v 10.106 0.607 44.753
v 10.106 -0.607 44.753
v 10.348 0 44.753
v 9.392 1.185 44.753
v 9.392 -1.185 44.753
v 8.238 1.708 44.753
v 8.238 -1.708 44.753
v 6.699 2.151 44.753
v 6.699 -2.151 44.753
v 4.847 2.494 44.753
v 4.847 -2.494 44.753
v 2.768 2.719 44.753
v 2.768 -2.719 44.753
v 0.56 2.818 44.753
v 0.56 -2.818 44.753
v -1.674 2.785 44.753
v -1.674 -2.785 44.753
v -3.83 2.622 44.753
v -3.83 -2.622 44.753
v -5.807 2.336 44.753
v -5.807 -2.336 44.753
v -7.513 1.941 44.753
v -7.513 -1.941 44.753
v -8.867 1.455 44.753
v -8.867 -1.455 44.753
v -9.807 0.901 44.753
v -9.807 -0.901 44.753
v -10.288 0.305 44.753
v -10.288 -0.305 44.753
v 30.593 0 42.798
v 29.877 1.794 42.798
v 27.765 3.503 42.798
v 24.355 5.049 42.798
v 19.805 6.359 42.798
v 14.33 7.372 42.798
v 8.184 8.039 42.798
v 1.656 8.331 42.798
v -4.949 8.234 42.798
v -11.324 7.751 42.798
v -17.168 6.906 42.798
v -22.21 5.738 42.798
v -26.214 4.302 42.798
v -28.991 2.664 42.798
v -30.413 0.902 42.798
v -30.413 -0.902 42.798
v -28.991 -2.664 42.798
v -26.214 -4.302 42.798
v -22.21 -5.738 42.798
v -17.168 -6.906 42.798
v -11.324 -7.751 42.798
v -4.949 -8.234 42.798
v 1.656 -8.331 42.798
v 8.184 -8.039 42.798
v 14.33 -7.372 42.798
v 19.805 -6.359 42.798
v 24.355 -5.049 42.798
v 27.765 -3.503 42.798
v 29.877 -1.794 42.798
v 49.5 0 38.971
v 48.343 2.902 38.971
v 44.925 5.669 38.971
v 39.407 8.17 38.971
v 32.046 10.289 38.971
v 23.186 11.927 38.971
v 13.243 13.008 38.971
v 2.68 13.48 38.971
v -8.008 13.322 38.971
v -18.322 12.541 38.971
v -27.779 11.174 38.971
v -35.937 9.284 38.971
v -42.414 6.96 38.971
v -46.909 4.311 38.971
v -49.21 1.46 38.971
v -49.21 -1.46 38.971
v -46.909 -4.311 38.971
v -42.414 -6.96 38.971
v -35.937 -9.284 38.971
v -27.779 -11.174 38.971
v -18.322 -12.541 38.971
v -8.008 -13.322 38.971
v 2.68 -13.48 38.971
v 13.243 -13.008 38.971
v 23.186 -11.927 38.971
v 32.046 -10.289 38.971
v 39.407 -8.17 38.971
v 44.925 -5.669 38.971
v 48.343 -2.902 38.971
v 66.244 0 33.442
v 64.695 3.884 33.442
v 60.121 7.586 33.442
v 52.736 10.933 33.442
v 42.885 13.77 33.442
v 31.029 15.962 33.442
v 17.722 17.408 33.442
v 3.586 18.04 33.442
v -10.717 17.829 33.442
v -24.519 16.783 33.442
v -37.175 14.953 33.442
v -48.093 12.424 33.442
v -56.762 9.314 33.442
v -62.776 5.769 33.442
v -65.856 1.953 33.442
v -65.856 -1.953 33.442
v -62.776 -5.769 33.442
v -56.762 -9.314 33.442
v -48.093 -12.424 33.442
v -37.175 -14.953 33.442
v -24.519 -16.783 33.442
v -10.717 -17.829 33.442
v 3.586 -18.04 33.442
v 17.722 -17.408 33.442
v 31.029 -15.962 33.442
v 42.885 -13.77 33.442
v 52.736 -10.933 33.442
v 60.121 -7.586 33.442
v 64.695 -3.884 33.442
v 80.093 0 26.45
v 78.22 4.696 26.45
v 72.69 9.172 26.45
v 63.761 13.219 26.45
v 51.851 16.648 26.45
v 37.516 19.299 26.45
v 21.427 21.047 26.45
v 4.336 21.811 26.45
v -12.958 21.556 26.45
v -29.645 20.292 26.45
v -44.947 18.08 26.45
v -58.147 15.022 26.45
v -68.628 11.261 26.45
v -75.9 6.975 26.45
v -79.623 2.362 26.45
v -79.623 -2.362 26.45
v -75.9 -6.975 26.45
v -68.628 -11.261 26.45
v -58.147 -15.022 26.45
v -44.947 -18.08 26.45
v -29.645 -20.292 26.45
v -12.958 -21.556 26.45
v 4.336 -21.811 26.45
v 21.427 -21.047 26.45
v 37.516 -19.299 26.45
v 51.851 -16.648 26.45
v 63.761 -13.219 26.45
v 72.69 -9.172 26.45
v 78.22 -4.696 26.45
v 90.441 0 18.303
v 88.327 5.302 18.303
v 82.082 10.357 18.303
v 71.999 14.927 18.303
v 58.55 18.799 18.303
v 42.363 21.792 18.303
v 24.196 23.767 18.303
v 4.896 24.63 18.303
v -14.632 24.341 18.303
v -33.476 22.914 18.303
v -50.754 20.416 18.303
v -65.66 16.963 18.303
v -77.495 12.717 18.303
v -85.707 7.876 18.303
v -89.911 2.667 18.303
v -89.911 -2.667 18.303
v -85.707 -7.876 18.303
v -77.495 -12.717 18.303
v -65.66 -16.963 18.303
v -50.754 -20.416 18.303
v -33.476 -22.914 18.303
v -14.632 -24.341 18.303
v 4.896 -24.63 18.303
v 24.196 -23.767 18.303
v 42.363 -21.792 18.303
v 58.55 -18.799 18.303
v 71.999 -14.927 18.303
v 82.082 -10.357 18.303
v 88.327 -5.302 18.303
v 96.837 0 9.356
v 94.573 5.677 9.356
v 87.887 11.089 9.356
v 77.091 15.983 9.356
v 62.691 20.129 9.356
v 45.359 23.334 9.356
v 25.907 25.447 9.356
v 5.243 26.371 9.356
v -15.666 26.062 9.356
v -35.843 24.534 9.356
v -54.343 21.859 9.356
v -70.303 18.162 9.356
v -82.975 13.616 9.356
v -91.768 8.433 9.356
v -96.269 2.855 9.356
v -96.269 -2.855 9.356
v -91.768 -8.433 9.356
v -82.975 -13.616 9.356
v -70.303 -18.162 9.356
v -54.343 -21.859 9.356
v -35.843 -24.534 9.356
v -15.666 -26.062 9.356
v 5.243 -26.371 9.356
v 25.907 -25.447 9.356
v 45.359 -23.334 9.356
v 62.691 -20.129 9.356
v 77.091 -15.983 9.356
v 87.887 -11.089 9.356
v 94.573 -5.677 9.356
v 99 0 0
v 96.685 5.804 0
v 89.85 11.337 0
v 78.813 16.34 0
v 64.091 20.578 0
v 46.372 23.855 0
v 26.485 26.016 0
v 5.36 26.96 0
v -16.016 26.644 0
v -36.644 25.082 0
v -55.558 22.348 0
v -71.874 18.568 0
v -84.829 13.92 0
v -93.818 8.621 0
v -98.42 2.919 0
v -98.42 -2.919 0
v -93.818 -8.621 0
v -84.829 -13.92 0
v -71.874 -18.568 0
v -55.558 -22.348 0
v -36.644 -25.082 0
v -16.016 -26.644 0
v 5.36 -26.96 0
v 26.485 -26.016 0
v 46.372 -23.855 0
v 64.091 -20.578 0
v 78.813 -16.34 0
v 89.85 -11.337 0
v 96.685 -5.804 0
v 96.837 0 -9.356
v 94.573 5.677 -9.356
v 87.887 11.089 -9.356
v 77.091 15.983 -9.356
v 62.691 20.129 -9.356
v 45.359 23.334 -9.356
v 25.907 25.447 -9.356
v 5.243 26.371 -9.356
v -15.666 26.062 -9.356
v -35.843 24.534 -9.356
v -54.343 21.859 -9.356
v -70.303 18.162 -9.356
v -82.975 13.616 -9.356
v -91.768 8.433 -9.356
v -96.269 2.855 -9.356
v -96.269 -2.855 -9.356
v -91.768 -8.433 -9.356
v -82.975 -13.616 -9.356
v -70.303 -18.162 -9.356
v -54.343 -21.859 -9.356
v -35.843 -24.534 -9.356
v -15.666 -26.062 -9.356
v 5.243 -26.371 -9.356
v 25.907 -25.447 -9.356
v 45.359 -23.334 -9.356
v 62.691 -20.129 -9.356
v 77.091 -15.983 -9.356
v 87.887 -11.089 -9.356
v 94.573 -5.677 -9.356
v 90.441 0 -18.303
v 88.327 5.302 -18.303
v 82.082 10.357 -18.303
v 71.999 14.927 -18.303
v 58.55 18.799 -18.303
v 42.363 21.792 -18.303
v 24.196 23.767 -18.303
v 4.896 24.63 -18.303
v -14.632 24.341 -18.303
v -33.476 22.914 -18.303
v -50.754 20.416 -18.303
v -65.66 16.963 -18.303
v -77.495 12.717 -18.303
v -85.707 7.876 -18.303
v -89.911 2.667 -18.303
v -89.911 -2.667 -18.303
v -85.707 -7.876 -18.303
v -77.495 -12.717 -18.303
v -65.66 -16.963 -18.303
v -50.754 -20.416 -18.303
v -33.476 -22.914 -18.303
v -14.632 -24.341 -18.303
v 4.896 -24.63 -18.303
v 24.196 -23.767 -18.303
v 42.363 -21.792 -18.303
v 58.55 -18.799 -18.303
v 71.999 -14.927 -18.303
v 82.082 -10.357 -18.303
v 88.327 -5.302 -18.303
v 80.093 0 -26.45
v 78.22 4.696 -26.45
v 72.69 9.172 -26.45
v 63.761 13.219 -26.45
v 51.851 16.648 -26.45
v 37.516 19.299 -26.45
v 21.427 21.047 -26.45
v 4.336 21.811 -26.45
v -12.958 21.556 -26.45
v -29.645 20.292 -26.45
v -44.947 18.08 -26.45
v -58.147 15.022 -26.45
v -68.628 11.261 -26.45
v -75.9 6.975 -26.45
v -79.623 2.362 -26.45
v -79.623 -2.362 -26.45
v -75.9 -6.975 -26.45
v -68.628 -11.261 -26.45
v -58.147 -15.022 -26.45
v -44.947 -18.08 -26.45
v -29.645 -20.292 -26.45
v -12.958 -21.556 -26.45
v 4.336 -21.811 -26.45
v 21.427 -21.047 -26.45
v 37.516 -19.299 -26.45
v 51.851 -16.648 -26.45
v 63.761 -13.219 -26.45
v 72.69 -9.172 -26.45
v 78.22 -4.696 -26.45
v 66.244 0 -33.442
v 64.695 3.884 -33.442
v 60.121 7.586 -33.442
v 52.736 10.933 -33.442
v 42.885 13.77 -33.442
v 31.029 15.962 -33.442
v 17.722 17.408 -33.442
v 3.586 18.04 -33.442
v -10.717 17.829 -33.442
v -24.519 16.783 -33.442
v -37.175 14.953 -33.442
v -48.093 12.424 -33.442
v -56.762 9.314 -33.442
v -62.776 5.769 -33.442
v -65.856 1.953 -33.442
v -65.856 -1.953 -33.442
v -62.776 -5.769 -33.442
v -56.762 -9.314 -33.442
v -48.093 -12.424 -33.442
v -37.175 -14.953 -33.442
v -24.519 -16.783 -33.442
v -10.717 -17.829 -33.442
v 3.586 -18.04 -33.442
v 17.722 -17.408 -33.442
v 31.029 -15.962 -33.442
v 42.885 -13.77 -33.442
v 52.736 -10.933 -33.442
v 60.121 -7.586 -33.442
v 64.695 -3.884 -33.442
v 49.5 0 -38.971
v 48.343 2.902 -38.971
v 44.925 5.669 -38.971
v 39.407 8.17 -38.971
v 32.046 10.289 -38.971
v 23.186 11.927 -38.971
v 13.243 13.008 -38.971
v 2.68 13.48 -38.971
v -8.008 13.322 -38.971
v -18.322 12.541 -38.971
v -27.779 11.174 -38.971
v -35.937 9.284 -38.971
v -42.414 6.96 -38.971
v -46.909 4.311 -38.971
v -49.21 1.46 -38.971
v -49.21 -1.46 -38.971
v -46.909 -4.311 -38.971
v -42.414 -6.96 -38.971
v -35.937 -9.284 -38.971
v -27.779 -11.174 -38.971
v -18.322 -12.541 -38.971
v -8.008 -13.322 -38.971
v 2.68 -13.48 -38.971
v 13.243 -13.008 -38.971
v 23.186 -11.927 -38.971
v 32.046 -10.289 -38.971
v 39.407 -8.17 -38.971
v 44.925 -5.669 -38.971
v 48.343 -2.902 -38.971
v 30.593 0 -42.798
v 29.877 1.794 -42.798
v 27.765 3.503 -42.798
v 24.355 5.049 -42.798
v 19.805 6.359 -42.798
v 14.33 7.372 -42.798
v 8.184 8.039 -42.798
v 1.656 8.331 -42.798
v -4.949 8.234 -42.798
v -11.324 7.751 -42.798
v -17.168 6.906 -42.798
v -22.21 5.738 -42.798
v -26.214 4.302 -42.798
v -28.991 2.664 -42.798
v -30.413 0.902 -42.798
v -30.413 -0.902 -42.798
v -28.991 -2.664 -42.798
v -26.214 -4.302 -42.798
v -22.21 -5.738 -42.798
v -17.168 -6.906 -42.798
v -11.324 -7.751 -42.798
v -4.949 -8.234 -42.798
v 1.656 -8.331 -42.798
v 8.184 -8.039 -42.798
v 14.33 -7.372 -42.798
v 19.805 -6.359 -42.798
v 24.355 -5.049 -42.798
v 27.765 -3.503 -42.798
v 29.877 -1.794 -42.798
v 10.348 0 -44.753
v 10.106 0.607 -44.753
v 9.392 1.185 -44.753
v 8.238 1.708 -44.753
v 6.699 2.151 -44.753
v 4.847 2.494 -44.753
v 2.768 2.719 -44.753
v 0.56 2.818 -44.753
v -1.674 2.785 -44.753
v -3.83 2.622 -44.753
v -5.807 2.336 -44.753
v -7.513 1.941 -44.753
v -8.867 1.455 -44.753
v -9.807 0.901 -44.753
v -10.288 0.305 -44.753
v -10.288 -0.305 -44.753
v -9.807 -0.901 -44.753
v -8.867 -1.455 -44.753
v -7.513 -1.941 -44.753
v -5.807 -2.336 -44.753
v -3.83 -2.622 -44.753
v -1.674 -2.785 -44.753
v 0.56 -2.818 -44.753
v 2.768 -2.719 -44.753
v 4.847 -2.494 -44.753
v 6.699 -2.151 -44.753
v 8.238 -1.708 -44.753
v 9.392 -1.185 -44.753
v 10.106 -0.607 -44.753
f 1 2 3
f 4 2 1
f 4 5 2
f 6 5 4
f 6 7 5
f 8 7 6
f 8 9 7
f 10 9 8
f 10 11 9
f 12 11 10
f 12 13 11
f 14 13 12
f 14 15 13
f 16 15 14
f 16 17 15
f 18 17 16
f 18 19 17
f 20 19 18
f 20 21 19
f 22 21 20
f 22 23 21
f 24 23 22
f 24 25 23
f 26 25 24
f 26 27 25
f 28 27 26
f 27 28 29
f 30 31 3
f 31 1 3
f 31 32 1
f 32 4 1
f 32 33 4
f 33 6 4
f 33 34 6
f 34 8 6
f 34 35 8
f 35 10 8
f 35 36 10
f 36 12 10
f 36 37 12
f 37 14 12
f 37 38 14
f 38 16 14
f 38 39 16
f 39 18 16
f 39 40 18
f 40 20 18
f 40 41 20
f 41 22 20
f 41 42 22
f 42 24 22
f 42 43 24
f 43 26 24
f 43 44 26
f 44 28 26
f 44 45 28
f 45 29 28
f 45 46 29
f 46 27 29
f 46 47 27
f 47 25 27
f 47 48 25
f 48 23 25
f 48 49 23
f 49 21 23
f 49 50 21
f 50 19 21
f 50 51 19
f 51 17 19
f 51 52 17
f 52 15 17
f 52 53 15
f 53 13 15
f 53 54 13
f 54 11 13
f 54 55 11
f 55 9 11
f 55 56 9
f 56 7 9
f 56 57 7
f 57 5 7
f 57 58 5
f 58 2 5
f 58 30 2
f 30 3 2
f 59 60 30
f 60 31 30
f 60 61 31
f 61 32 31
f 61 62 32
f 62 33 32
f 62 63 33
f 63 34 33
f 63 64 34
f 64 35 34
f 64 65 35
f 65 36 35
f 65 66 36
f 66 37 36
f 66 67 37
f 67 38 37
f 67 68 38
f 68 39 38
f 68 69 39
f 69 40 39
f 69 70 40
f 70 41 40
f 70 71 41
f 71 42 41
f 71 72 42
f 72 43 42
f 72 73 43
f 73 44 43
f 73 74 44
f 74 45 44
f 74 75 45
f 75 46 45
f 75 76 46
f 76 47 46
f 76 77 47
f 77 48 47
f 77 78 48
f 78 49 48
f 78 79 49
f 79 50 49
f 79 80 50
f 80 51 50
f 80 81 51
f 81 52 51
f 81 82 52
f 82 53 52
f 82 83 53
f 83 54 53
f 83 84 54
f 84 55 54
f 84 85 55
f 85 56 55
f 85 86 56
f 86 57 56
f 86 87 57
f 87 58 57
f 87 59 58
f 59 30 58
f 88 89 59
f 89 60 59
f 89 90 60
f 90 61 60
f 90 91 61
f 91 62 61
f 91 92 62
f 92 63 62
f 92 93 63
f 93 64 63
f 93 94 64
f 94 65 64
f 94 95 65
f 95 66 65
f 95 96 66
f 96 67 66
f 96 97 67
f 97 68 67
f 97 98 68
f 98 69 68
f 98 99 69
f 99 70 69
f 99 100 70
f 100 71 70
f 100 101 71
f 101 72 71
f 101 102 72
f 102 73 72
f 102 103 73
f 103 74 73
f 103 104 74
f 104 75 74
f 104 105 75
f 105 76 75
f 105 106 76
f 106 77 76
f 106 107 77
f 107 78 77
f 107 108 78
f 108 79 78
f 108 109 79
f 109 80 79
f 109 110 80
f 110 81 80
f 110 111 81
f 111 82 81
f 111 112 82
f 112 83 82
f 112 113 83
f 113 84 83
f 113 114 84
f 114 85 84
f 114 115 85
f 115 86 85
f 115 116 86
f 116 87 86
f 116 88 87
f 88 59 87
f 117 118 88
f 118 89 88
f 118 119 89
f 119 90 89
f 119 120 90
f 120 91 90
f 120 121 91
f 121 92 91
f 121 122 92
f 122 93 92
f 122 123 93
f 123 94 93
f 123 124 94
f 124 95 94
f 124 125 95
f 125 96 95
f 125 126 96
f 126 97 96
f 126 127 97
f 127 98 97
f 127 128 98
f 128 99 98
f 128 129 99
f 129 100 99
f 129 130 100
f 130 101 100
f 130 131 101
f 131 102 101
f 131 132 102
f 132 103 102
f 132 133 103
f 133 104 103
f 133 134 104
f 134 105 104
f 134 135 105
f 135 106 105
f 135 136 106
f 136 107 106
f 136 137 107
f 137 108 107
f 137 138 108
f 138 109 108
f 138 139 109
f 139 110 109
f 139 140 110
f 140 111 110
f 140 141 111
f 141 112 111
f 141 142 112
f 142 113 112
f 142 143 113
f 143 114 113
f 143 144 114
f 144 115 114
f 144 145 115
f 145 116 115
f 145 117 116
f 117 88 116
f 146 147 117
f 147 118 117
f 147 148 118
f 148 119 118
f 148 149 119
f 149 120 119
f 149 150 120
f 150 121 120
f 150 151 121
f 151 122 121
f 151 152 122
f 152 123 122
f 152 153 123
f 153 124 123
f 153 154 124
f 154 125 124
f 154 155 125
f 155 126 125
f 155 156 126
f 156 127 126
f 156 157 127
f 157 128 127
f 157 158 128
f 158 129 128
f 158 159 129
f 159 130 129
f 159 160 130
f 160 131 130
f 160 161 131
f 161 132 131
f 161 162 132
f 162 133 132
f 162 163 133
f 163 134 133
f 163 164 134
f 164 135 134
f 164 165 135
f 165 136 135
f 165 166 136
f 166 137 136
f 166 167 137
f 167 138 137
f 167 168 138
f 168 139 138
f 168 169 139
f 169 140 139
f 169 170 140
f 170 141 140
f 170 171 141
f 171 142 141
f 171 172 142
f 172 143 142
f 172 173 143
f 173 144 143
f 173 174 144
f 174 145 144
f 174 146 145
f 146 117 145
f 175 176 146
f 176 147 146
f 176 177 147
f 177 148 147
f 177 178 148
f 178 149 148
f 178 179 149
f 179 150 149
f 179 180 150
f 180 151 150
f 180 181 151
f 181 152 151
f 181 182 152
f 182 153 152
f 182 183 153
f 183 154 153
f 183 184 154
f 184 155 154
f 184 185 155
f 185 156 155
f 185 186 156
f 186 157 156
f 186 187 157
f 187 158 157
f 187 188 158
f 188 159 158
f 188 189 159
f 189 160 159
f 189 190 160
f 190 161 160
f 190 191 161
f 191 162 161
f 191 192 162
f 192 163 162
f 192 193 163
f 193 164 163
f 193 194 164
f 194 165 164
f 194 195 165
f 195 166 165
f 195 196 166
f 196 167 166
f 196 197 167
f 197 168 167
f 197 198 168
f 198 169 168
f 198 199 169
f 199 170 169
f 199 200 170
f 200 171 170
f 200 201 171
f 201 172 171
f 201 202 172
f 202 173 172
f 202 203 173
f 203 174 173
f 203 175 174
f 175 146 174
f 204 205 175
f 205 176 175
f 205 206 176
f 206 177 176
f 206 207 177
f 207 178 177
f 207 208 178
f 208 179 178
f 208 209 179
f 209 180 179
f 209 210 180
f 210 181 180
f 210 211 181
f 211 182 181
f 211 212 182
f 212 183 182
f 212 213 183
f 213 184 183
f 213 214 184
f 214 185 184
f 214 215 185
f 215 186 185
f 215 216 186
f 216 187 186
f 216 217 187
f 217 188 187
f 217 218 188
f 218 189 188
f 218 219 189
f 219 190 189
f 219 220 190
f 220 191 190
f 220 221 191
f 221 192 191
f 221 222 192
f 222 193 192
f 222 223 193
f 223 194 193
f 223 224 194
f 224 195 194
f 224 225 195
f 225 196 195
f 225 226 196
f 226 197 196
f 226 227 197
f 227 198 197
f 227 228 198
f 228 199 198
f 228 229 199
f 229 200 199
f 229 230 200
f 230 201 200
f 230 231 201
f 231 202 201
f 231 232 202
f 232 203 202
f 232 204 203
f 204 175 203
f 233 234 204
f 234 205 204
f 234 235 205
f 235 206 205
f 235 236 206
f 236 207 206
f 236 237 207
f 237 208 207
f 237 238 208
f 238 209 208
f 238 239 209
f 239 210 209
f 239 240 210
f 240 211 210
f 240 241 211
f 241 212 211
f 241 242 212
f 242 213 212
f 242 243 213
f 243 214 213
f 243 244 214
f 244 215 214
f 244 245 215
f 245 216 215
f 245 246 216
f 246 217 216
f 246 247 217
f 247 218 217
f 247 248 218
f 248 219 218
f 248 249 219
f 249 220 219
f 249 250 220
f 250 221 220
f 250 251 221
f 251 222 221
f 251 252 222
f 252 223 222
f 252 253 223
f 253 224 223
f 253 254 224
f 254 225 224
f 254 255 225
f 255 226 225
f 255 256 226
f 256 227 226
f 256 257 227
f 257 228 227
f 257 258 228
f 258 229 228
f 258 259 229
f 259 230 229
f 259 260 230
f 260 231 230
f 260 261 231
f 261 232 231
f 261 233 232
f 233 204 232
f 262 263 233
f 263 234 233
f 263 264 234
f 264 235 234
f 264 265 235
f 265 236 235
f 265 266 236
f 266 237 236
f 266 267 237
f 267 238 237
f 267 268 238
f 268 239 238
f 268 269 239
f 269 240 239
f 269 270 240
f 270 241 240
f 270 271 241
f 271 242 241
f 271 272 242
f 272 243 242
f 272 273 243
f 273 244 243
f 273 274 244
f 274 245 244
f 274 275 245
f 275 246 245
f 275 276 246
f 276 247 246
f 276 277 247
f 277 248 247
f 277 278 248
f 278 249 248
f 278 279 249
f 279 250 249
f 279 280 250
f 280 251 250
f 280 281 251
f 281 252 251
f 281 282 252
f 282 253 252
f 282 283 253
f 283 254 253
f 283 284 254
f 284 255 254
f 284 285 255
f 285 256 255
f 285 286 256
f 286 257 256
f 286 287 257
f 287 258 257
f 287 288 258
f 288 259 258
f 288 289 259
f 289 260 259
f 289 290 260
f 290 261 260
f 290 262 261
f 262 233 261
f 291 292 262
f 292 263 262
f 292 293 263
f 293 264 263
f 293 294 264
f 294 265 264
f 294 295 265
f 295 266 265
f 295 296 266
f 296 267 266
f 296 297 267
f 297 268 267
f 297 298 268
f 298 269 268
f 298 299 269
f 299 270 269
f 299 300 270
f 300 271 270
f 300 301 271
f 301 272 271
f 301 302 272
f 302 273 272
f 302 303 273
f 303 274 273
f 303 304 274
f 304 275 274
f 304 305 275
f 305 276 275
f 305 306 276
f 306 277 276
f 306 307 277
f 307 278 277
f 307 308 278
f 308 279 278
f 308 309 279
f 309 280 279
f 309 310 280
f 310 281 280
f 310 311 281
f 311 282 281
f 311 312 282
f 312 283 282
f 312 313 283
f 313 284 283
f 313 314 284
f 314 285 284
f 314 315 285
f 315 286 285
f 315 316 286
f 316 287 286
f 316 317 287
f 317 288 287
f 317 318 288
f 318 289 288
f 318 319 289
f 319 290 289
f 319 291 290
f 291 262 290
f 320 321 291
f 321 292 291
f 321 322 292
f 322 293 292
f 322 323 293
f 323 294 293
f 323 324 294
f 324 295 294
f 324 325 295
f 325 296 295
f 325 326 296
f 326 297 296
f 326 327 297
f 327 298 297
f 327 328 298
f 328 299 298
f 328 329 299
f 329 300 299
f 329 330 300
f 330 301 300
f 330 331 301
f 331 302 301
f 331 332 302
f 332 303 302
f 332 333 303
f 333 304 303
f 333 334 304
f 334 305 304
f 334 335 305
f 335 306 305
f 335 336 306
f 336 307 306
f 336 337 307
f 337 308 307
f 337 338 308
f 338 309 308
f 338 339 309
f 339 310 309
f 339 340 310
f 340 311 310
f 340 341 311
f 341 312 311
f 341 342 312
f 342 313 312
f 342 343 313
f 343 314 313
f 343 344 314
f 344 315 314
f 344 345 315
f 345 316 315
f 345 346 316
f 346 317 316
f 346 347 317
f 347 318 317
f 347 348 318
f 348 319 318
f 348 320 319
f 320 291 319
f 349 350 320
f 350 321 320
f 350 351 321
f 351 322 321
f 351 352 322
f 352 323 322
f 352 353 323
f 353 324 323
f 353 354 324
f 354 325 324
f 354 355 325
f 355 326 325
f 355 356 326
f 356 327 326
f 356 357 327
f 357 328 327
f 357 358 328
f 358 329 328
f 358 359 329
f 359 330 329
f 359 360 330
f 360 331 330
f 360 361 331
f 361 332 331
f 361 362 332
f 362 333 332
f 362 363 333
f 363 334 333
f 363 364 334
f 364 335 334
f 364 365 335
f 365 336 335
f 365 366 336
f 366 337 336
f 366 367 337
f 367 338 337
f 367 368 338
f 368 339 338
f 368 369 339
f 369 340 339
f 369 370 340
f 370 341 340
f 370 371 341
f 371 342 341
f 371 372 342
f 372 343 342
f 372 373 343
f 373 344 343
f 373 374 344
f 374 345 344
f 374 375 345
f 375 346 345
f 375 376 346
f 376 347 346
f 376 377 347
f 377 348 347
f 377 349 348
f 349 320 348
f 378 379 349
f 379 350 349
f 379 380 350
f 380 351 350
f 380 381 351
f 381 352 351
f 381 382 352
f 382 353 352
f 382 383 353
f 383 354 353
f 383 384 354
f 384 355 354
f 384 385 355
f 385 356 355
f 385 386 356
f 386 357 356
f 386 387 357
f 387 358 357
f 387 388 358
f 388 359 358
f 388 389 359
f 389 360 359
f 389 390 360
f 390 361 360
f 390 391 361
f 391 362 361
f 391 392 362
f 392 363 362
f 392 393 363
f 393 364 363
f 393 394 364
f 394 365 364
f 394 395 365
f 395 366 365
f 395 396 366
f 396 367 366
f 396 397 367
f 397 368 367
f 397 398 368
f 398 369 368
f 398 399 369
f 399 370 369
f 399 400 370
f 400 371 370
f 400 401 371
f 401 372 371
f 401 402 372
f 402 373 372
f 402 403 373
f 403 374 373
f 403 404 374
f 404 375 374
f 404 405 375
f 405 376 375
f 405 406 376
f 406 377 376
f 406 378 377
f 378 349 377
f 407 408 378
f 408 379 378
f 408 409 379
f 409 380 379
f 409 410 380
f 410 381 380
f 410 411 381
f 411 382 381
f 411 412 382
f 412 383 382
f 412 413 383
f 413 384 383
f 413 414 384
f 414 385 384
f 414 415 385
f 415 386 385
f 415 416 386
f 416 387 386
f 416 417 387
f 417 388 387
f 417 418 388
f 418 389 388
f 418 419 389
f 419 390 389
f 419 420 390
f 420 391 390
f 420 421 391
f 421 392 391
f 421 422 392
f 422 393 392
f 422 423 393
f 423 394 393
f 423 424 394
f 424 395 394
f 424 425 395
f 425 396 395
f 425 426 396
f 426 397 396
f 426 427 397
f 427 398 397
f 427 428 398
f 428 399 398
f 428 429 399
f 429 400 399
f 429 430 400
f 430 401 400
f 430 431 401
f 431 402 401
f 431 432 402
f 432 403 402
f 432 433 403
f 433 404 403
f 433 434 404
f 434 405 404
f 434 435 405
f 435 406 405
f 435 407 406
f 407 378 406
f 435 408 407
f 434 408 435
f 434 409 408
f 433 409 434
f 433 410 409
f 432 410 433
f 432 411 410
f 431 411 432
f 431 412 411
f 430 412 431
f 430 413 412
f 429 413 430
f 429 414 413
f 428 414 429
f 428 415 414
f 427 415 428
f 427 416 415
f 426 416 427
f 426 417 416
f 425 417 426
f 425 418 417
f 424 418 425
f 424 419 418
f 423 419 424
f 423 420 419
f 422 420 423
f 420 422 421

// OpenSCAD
// Generated by SolidPython 1.0.1 on 2020-07-29 00:46:49


scale(v = [11, 3, 5]) {
	sphere(r = 9);
}
/***********************************************
*********      SolidPython code:      **********
************************************************
 
# import packages: SolidPython
from solid import *
from solid.utils import *
from itertools import chain, combinations, permutations


class Resize:

    def __init__(self, scad_file):
        self.scad_file = scad_file
        #self.scad_file = import_scad(scad_file)
        # cone/cylinder param:
        self.r1 = 0
        self.r2 = 0
        self.h = 0
        # rectangular prism param:
        self.w = 0
        self.l = 0
        # ellipse param:
        self.r = 0

    # import OpenScad code (file name corresponds to shape)


    # classify shape + parameters
    def assign(self, param1, param2, param3):
        if self.scad_file == 'cone.scad':
            self.r1 = param1
            self.r2 = param2
            self.h = param3
        elif self.scad_file == 'cylinder.scad':
            self.r1 = param1
            self.r2 = param2
            self.h = param3
        elif self.scad_file == 'rectangularPrism.scad':
            self.h = param1
            self.l = param2
            self.w = param3
        else:
            self.r = param1
            self.h = param2

    # resize parameters
    def iterate(self):
        x = range(3, 20, 2)
        i = 1
        if self.scad_file == 'cone.scad':
            tempList = list(permutations(x, 2))
            for temp in tempList:
                param1 = temp[0]
                param2 = temp[1]
                filepath = 'produced_scad_files/' + 'cone' + str(param1) + '_' + str(param2) + '_' + '.scad'
                scad_render_to_file(cylinder(h=param1, r1=param2, r2=0), filepath)

        elif self.scad_file == 'cylinder.scad':
            tempList = list(permutations(x, 3))
            for temp in tempList:
                param1 = temp[0]
                param2 = temp[1]
                filepath = 'produced_scad_files/' + 'cylinder' + str(param1) + '_' + str(param2) + '_' + '.scad'
                scad_render_to_file(cylinder(h=param1, r1=param2, r2=param2), filepath)

        elif self.scad_file == 'rectangularPrism.scad':
            tempList = list(permutations(x, 3))
            for temp in tempList:
                param1 = temp[0]
                param2 = temp[1]
                param3 = temp[2]
                filepath = 'produced_scad_files/' + 'rectangularPrism' + str(param1) + '_' + str(param2) + '_' + str(
                    param3) + '.scad'
                scad_render_to_file(cube(size=(param1, param2, param3)), filepath)

        elif self.scad_file == 'ellipse.scad':
            tempList = list(permutations(x, 4))
            for temp in tempList:
                param1 = temp[0]
                param2 = temp[1]
                param3 = temp[2]
                param4 = temp[3]
                filepath = 'produced_scad_files/' + 'ellipse' + str(param1) + '_' + str(param2) + '_' + str(param3) + '_' + str(param4) + '.scad'
                scad_render_to_file(scale([param1, param2, param3])(sphere(r=param4)), filepath)

    def render_to_scadfile(self):
        scad_render_to_file(scad, 'example.scad') 
 
************************************************/
